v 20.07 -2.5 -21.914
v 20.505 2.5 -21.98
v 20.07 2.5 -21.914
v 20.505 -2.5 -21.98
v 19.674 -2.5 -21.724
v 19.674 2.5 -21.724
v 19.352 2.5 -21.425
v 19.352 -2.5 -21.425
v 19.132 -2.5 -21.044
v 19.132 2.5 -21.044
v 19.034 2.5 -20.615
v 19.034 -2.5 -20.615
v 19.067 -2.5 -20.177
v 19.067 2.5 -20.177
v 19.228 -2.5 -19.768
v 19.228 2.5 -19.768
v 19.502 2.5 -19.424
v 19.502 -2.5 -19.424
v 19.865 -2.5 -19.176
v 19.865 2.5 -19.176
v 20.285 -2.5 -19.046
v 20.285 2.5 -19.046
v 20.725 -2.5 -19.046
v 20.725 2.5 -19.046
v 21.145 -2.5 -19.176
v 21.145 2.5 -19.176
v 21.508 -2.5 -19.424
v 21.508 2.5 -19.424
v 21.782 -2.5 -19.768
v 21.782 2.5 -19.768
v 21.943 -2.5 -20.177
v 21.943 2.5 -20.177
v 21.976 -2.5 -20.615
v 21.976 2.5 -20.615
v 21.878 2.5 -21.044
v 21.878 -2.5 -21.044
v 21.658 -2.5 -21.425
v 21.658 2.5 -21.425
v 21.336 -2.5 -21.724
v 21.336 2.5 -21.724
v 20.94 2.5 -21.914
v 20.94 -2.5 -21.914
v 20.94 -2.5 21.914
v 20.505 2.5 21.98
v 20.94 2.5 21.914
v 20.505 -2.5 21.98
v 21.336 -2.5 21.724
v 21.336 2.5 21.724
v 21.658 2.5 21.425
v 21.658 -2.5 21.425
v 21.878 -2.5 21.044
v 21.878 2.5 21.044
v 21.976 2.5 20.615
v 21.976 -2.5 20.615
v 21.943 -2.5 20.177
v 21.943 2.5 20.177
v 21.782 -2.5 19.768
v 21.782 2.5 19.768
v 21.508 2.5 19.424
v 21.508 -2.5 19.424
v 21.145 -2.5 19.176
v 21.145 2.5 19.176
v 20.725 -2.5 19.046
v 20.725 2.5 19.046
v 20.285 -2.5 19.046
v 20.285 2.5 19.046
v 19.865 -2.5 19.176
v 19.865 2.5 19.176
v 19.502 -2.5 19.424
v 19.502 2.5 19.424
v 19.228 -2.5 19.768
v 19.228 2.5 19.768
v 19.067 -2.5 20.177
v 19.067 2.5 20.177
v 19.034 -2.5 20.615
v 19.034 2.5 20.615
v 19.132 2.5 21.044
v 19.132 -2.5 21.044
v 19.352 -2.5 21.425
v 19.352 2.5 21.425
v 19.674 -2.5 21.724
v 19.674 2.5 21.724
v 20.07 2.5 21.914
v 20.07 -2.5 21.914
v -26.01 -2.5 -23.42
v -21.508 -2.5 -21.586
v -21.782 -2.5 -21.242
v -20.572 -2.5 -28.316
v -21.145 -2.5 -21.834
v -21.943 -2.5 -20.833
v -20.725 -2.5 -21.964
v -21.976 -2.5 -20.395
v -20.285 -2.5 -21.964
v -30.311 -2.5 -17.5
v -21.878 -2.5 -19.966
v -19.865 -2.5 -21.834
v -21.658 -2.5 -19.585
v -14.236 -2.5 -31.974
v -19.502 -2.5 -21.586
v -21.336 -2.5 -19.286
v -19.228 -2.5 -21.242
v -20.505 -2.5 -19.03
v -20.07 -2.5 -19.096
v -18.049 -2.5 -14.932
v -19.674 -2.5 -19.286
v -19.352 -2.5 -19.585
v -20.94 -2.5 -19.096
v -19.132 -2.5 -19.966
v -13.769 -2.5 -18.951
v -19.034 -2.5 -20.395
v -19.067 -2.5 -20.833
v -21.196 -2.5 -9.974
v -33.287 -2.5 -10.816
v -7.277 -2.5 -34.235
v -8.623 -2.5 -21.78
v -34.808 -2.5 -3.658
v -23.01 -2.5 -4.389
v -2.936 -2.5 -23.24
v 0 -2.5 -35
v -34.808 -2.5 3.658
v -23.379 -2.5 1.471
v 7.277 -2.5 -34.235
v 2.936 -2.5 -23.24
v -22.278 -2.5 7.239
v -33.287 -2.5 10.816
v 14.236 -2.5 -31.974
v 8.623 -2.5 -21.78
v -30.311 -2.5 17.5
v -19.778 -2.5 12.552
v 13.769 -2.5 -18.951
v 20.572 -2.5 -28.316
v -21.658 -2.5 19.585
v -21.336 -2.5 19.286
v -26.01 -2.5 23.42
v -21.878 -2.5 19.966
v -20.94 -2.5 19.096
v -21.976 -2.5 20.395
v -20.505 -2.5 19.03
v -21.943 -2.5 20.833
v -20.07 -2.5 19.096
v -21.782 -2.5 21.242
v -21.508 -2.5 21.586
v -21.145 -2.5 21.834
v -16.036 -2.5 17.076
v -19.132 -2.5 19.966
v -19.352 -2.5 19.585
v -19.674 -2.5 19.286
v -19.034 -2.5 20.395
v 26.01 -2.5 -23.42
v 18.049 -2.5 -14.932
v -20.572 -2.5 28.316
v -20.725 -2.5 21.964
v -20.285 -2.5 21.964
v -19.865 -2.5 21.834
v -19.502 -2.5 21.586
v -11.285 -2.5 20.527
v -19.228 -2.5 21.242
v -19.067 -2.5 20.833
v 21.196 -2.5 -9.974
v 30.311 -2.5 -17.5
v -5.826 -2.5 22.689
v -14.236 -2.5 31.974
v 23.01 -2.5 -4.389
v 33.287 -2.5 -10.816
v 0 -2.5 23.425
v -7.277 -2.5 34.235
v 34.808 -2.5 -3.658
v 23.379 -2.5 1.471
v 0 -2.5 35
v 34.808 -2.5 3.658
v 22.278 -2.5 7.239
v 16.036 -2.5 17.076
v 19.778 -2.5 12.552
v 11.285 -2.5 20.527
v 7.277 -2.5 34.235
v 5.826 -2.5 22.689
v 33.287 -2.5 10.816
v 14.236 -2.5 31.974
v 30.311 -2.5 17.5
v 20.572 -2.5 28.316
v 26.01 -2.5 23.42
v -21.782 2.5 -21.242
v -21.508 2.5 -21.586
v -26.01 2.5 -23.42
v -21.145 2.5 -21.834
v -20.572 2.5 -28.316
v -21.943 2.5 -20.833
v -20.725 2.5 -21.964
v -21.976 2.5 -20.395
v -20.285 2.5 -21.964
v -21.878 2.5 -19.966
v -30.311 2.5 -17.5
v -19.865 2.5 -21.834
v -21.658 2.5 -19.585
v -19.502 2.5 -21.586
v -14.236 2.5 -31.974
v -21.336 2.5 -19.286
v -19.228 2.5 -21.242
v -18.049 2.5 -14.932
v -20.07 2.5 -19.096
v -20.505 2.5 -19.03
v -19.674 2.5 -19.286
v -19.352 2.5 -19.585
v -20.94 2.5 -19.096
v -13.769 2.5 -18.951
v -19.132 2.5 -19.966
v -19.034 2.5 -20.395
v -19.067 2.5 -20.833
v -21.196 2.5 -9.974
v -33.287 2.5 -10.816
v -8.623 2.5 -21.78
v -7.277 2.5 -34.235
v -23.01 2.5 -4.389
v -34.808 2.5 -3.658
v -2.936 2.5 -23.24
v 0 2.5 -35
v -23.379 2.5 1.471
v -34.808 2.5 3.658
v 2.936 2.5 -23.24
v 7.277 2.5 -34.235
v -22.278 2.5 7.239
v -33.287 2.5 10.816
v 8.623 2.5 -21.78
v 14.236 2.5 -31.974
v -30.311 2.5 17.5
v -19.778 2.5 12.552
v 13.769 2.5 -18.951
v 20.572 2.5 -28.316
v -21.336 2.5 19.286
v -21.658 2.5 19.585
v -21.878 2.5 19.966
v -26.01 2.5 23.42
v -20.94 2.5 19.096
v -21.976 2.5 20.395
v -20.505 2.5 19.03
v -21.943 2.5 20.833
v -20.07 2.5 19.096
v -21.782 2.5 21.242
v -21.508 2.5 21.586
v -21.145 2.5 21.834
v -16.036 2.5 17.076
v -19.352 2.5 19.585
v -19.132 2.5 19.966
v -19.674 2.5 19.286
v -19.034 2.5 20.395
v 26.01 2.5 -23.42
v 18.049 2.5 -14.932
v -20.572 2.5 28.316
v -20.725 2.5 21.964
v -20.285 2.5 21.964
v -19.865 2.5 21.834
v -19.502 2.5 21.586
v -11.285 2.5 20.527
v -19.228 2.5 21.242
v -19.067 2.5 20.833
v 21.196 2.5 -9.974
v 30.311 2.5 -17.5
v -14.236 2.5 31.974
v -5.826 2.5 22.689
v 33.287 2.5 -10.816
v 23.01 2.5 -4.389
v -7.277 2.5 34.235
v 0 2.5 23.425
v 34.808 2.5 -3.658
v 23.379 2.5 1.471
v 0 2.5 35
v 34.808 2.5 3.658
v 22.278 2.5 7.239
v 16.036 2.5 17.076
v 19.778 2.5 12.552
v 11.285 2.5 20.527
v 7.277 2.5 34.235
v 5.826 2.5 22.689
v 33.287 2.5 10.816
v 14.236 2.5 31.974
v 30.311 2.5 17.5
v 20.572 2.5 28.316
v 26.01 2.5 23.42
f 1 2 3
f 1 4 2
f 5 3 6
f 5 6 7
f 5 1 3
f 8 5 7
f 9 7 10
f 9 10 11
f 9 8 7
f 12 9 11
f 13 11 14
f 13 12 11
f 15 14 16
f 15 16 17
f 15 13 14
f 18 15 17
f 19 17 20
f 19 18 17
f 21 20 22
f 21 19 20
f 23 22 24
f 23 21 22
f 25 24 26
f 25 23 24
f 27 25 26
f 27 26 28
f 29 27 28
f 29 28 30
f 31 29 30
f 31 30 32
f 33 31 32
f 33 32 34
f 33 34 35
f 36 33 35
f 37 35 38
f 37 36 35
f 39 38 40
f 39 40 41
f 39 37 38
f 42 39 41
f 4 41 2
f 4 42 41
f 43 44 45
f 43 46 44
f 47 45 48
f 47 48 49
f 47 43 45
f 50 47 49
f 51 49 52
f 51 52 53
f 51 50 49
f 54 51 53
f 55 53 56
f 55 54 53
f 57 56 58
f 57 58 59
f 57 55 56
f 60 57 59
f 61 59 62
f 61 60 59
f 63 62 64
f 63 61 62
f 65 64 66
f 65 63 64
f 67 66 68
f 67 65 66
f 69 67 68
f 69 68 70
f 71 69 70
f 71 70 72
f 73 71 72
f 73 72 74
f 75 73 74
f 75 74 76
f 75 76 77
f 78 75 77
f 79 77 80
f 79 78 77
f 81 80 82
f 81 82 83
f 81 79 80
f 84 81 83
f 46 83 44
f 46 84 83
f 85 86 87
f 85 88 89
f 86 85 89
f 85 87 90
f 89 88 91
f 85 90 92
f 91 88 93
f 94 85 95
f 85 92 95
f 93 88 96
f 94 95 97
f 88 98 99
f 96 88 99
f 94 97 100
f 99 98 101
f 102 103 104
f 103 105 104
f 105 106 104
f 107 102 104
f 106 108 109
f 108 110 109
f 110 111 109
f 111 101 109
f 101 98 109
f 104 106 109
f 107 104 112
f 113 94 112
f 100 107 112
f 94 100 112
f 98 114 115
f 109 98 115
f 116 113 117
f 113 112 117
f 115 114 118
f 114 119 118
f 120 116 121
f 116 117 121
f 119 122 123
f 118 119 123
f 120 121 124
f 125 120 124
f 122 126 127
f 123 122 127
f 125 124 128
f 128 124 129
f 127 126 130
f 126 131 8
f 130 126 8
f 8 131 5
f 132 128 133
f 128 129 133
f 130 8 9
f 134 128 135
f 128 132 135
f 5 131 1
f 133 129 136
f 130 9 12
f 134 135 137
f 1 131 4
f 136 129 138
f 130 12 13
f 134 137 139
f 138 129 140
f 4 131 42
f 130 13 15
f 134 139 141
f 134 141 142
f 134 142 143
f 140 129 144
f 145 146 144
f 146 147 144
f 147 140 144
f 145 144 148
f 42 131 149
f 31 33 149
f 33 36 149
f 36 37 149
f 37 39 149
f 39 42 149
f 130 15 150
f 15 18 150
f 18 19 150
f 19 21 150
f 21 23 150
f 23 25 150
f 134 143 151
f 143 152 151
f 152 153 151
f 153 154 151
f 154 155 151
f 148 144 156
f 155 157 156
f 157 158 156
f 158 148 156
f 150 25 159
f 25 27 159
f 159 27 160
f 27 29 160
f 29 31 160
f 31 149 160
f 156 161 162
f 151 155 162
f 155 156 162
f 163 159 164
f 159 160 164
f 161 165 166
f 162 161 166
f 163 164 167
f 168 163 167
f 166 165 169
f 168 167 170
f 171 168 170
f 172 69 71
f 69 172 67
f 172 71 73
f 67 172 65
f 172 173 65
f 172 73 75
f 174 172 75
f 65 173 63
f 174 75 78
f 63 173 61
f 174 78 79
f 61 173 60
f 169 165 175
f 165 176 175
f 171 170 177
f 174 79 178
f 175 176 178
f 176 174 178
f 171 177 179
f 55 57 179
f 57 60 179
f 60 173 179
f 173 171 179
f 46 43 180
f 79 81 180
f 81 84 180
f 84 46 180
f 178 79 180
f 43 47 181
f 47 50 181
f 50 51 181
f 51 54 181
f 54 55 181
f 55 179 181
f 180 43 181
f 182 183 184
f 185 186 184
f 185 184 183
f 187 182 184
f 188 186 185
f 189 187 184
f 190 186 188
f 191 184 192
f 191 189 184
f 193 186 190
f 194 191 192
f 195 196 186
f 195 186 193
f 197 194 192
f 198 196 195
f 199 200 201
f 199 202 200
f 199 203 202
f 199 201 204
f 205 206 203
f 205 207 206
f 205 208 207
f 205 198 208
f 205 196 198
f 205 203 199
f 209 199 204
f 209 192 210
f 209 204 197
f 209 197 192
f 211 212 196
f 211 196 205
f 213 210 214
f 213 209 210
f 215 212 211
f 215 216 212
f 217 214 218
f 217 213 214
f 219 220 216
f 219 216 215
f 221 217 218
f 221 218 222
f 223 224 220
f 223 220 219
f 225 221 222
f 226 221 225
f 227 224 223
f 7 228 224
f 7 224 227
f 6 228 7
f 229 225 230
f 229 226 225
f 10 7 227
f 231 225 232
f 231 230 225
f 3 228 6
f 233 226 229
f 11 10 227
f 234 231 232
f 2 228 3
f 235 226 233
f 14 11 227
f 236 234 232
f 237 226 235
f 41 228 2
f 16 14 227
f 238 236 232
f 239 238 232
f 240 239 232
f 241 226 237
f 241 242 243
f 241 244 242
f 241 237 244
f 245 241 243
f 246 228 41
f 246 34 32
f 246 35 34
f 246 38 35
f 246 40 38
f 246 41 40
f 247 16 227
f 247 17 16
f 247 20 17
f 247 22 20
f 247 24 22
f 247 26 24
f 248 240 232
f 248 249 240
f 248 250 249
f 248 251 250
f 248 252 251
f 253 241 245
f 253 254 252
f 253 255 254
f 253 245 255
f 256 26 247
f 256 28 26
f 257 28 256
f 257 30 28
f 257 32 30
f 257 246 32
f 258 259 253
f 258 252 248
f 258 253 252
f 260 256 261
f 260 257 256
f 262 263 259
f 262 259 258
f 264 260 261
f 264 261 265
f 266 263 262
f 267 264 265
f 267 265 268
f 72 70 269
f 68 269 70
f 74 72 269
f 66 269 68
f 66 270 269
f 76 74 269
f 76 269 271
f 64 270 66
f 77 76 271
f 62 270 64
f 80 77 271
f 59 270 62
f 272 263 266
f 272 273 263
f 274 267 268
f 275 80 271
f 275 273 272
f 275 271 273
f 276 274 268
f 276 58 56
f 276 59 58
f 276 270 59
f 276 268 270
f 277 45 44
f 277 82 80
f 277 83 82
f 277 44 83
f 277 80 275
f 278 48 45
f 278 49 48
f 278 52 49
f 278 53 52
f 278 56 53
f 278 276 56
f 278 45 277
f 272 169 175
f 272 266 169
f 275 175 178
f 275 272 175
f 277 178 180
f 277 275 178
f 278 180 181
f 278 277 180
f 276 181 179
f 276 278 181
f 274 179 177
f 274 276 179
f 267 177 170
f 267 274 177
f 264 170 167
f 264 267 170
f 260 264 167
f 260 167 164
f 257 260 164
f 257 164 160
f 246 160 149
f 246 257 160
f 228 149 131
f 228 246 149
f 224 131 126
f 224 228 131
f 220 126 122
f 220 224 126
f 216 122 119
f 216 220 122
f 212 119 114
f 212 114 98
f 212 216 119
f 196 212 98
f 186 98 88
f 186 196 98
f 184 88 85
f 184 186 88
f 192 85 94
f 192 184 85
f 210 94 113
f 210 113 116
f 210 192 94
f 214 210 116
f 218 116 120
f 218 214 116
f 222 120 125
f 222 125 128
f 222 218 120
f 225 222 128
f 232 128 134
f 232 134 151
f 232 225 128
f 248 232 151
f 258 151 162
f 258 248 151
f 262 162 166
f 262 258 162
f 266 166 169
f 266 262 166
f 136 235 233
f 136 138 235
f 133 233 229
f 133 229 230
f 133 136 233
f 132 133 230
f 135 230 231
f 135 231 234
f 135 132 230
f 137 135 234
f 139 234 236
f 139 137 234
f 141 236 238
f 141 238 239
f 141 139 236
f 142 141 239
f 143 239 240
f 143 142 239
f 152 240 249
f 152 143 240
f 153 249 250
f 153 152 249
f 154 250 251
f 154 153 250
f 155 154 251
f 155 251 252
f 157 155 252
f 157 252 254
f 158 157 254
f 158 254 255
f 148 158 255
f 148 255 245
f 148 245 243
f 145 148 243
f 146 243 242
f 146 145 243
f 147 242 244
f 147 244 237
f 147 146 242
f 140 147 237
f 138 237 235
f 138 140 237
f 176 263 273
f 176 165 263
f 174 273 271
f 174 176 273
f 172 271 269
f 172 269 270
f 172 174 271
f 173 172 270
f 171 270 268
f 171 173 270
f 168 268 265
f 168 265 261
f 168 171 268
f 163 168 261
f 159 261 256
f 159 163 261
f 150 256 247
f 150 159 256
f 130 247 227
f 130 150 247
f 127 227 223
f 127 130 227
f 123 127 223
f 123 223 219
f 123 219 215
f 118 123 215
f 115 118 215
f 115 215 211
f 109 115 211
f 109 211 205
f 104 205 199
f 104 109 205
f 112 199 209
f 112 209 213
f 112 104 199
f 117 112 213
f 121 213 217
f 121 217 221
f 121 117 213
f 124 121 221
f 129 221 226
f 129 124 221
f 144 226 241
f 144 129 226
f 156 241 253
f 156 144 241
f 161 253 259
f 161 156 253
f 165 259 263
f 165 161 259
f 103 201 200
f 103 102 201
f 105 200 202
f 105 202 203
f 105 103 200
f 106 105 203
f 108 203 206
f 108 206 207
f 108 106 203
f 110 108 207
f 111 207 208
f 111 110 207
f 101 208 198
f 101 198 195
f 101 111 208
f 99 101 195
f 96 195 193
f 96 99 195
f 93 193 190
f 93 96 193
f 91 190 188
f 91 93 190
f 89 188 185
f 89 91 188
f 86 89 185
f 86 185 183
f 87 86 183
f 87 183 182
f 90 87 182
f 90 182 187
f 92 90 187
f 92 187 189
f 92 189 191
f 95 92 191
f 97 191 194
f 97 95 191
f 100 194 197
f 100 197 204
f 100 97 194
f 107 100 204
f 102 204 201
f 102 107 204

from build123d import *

# Parameters (mm, degrees)
SKETCH1_R           = 35
SKETCH1_R_2         = 23.425
SKETCH1_R_3         = 1.475
BOSS_EXTRUDE1_DEPTH = 2.5


with BuildPart() as part:
    # Sketch1 → Boss-Extrude1 (new, symmetric)
    with BuildSketch(Plane(origin=(0, 0, 0), x_dir=(1, 0, 0), z_dir=(0, 1, 0))):
        with Locations(Location((0, 0, 0), (0, 0, 270))):
            Circle(SKETCH1_R)
        with Locations(Location((0, 0, 0), (0, 0, 270))):
            Circle(SKETCH1_R_2, mode=Mode.SUBTRACT)
        with Locations(Location((-20.505, 20.505, 0), (0, 0, 270))):
            Circle(SKETCH1_R_3, mode=Mode.SUBTRACT)
        with Locations(Location((20.505, 20.505, 0), (0, 0, 90))):
            Circle(SKETCH1_R_3, mode=Mode.SUBTRACT)
        with Locations(Location((20.505, -20.505, 0), (0, 0, 270))):
            Circle(SKETCH1_R_3, mode=Mode.SUBTRACT)
        with Locations(Location((-20.505, -20.505, 0), (0, 0, 90))):
            Circle(SKETCH1_R_3, mode=Mode.SUBTRACT)
    extrude(amount=BOSS_EXTRUDE1_DEPTH, both=True)


solid = part.part
